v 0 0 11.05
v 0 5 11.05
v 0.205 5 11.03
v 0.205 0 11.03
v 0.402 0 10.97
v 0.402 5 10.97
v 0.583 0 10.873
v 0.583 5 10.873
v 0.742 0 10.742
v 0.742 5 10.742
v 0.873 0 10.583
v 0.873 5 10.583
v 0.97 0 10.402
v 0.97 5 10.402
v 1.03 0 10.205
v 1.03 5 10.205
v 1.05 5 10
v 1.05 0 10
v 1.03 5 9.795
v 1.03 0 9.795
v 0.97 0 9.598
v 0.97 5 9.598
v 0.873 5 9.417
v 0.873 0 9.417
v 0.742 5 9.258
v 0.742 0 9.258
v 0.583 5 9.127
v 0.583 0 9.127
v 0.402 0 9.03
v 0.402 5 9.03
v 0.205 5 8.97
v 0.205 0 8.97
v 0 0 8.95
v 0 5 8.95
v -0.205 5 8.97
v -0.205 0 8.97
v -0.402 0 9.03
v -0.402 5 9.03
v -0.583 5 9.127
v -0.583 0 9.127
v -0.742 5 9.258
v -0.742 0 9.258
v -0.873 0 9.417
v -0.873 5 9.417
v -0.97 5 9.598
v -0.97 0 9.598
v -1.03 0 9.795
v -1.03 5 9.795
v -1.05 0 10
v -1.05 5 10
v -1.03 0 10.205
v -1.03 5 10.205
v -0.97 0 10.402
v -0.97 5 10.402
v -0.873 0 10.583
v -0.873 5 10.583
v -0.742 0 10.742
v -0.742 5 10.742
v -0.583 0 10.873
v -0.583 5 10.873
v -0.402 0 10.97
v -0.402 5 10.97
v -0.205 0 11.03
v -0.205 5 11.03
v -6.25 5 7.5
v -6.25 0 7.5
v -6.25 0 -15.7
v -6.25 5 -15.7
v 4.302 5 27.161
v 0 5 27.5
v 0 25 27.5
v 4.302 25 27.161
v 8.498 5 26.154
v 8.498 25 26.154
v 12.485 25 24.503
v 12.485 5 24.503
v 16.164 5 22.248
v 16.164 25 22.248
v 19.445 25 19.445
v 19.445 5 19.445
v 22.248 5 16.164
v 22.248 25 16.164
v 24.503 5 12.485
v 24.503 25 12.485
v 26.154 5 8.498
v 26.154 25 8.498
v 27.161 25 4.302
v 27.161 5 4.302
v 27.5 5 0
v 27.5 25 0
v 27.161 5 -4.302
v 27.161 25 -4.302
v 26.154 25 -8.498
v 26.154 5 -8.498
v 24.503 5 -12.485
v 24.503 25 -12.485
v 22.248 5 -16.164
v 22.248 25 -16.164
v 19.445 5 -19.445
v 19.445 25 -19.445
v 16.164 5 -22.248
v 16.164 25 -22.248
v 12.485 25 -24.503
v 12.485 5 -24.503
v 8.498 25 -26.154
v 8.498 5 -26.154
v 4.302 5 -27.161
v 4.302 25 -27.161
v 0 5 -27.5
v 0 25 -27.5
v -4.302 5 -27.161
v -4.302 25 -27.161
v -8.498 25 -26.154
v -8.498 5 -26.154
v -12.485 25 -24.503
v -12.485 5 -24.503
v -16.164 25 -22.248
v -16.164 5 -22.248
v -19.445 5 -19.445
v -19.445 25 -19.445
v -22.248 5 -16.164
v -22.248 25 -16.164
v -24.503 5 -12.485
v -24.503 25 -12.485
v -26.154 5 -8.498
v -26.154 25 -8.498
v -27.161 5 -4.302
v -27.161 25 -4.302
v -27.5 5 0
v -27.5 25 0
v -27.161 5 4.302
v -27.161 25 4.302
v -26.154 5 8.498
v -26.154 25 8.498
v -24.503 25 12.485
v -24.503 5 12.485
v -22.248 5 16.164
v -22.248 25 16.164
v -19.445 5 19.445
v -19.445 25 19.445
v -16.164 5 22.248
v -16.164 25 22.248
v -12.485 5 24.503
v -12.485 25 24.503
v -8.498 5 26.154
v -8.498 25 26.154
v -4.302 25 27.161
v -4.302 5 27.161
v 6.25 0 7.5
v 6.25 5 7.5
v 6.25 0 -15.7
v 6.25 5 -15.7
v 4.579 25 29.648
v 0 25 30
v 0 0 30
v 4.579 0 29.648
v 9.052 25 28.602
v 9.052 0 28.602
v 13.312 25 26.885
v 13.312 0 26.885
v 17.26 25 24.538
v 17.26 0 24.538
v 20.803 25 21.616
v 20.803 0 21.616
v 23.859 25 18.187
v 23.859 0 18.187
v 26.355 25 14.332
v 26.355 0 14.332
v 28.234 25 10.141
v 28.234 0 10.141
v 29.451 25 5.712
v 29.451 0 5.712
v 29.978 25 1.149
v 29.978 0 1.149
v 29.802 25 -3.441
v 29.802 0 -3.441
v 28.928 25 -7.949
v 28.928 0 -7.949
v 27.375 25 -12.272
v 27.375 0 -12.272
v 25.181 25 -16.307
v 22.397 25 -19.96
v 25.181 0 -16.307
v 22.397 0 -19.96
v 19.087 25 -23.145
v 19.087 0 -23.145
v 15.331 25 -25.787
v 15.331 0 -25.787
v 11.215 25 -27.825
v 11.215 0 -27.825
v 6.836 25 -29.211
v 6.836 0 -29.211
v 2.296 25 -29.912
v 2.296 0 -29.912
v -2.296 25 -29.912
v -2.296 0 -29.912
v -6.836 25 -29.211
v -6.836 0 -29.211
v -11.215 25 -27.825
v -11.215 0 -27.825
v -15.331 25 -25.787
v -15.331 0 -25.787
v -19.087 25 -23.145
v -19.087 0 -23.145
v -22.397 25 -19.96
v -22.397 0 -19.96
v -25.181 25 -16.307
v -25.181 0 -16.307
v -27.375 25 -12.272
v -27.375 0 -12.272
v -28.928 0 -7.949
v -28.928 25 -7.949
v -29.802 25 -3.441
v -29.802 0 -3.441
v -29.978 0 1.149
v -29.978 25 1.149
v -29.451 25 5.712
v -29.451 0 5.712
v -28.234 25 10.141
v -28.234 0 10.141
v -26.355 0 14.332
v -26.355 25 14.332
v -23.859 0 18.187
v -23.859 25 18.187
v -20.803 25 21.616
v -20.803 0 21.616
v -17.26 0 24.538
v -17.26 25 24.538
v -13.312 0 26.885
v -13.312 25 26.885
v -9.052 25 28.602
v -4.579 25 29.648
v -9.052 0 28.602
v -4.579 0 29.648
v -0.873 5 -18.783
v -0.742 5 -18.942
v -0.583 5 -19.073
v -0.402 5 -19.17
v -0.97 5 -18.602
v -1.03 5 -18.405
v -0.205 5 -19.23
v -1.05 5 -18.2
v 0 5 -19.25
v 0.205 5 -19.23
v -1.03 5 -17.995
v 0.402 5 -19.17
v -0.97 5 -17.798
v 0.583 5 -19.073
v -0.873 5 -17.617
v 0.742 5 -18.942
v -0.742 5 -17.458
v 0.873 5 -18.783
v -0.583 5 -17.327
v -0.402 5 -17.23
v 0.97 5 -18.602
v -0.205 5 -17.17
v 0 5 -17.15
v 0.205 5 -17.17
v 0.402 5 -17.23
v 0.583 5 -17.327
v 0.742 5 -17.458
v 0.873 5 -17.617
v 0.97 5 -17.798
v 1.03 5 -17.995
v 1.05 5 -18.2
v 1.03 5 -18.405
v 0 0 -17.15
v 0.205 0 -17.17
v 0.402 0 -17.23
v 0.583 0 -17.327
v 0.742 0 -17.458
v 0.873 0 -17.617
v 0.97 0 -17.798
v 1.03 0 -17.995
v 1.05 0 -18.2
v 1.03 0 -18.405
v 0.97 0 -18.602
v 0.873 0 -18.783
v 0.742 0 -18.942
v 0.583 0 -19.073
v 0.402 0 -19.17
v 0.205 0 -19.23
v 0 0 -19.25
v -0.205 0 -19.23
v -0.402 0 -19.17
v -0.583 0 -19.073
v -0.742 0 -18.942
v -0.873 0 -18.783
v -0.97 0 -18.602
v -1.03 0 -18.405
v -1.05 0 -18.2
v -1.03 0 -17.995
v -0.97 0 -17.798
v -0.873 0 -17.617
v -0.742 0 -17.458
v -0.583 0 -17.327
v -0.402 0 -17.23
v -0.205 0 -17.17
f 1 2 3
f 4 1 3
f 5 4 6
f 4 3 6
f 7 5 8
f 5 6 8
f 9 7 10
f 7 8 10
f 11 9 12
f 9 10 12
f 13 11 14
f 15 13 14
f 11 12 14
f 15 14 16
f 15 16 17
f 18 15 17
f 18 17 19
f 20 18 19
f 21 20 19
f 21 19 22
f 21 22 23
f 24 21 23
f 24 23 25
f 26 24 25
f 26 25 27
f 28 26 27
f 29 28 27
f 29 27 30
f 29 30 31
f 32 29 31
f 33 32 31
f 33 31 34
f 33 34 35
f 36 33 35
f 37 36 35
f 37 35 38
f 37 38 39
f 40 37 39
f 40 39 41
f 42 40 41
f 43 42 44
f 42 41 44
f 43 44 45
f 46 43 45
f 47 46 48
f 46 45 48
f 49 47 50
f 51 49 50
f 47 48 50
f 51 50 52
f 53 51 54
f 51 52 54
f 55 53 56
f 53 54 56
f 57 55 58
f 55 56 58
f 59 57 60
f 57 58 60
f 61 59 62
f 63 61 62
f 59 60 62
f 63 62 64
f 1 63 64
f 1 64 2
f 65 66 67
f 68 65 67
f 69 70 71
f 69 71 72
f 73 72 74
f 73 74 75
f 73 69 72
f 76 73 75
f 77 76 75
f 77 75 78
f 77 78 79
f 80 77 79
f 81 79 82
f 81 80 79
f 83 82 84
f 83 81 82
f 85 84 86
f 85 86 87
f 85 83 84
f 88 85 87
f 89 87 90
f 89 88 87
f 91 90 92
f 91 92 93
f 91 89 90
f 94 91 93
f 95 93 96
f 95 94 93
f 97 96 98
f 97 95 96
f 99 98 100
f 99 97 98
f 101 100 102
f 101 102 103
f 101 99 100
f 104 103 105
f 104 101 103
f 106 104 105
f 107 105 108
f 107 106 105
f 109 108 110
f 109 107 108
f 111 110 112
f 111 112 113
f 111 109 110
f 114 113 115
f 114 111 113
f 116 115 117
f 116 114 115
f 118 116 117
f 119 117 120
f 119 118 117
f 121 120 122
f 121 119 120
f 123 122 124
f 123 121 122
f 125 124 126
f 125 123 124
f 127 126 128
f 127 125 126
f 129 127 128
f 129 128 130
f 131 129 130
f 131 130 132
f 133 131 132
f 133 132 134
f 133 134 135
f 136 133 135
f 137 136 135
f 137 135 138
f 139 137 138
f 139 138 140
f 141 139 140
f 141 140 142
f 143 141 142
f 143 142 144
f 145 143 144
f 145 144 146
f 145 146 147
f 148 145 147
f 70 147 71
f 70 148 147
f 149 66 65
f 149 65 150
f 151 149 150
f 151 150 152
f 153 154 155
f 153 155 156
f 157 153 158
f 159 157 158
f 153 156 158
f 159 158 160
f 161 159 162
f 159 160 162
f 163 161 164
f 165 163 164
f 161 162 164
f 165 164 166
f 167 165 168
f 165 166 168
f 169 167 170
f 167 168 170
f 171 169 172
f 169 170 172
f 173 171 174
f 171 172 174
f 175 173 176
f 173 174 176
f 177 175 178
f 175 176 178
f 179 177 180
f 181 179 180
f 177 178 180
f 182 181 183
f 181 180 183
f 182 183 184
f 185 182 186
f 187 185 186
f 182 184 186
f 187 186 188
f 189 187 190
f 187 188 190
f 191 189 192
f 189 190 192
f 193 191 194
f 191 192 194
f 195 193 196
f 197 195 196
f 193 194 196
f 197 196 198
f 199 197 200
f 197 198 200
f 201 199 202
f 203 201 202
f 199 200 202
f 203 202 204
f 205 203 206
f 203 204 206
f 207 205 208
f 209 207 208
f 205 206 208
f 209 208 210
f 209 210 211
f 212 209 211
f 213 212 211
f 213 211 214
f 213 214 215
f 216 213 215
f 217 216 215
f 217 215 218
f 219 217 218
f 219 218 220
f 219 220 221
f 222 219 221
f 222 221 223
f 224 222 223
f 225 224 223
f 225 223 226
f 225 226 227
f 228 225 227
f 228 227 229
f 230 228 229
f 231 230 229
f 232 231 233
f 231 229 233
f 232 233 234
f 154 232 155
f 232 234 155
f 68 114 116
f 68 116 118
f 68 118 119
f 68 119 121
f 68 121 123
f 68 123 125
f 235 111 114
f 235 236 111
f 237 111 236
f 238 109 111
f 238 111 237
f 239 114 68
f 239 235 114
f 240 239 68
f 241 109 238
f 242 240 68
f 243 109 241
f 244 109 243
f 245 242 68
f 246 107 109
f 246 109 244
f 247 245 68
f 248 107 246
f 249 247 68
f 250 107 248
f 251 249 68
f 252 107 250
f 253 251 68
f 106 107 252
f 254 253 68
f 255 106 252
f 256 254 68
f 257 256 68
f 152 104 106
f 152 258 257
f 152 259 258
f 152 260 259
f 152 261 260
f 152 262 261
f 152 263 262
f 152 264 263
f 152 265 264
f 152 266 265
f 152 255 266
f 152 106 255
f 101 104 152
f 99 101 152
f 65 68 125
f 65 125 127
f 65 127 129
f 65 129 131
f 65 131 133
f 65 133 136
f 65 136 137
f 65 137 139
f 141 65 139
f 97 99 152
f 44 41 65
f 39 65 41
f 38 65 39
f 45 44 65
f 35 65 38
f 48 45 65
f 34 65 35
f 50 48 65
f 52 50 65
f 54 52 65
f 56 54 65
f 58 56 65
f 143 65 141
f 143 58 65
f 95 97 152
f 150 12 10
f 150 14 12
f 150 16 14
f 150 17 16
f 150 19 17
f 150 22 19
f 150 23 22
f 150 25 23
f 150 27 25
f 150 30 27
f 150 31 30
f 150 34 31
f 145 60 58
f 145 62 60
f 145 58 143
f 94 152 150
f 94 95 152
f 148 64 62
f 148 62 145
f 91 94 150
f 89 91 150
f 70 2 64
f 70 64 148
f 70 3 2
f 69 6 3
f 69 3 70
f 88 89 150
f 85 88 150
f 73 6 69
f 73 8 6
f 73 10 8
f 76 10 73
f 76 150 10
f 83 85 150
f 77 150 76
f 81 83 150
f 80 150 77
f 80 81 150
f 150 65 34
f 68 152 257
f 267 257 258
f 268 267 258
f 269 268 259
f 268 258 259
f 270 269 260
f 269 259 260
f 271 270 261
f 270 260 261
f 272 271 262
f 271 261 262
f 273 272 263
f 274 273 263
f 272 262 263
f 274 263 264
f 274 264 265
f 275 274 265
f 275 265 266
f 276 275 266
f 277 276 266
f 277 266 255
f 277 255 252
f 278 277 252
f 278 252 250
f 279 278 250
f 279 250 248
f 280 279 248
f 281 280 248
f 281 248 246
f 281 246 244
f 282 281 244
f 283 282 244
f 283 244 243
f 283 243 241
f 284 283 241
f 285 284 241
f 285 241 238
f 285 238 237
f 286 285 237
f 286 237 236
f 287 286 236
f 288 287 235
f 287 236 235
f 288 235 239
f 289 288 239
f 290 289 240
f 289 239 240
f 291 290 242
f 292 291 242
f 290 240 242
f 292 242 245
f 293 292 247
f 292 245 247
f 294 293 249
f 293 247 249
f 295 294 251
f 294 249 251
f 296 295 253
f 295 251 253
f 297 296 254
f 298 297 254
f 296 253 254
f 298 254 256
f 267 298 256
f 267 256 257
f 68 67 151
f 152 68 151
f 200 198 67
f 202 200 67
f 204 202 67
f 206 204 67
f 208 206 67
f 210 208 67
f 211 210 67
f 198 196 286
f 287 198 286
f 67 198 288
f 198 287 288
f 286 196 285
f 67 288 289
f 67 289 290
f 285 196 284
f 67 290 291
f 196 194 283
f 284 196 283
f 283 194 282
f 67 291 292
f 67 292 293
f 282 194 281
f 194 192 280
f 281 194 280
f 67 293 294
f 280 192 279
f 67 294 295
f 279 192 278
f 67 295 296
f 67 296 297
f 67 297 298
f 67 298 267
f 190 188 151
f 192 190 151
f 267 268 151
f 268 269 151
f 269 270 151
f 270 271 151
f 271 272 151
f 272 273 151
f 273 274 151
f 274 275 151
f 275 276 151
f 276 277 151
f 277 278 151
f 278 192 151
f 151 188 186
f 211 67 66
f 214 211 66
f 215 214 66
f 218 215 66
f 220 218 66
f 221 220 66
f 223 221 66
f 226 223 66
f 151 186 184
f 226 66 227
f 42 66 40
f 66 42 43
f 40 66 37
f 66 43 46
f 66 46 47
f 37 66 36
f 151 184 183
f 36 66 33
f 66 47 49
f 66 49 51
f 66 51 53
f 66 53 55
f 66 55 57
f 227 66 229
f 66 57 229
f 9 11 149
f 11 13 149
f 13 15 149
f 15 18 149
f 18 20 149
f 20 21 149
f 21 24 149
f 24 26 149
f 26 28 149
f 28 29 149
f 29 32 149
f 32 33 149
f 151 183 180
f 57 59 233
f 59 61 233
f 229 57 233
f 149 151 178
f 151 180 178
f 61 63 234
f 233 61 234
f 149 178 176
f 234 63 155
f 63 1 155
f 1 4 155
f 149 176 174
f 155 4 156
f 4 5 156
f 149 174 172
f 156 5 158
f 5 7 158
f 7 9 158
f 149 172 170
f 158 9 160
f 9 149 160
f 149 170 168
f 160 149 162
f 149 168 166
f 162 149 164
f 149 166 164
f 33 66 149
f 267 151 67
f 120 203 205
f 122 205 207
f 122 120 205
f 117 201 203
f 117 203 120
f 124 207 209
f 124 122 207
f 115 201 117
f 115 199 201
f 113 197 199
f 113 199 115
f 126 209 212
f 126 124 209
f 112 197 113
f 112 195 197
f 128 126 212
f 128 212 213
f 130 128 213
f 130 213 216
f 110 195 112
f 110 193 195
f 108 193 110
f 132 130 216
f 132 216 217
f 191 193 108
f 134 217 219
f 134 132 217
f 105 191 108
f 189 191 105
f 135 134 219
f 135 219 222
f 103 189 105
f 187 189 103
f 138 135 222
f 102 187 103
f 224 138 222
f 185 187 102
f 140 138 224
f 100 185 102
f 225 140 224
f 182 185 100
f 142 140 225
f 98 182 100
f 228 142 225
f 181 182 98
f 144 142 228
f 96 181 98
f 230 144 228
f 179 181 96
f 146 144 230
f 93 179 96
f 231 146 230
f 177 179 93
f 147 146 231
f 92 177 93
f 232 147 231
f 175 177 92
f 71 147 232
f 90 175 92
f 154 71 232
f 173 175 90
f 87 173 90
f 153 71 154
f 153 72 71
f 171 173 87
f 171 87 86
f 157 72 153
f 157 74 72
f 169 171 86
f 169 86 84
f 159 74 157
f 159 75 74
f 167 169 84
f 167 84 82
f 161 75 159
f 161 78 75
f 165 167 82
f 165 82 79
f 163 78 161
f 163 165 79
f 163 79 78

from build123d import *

# Parameters (mm, degrees)
SKETCH1_R           = 30
SKETCH1_W           = 12.5
SKETCH1_H           = 23.2
BOSS_EXTRUDE1_DEPTH = 5
SKETCH4_R           = 30
SKETCH4_R_2         = 27.5
BOSS_EXTRUDE3_DEPTH = 20
CUT_EXTRUDE2_REACH  = 48.904
SKETCH5_R           = 1.05


with BuildPart() as part:
    # Sketch1 → Boss-Extrude1 (new body)
    with BuildSketch(Plane(origin=(0, 0, 0), x_dir=(1, 0, 0), z_dir=(0, 1, 0))):
        with Locations(Location((0, 0, 0), (0, 0, 270))):
            Circle(SKETCH1_R)
        with Locations((0, 4.1)):
            Rectangle(SKETCH1_W, SKETCH1_H, mode=Mode.SUBTRACT)
    extrude(amount=BOSS_EXTRUDE1_DEPTH)

    # Sketch4 → Boss-Extrude3 (add)
    with BuildSketch(Plane(origin=(0, 5, 0), x_dir=(1, 0, 0), z_dir=(0, 1, 0))):
        with Locations(Location((0, 0, 0), (0, 0, 270))):
            Circle(SKETCH4_R)
        with Locations(Location((0, 0, 0), (0, 0, 270))):
            Circle(SKETCH4_R_2, mode=Mode.SUBTRACT)
    extrude(amount=BOSS_EXTRUDE3_DEPTH)

    # Sketch5 → Cut-Extrude2 (cut, up to next)
    with BuildSketch(Plane(origin=(0, 5, 0), x_dir=(1, 0, 0), z_dir=(0, 1, 0)), mode=Mode.PRIVATE) as cut_extrude2_sk1:
        with Locations(Location((0, 18.2, 0), (0, 0, 270))):
            Circle(SKETCH5_R)
    cut_extrude2_tool1 = extrude(cut_extrude2_sk1.sketch, amount=-CUT_EXTRUDE2_REACH, mode=Mode.PRIVATE) & part.part
    # Sketch5 → Cut-Extrude2 (cut, up to next)
    with BuildSketch(Plane(origin=(0, 5, 0), x_dir=(1, 0, 0), z_dir=(0, 1, 0)), mode=Mode.PRIVATE) as cut_extrude2_sk2:
        with Locations(Location((0, -10, 0), (0, 0, 270))):
            Circle(SKETCH5_R)
    cut_extrude2_tool2 = extrude(cut_extrude2_sk2.sketch, amount=-CUT_EXTRUDE2_REACH, mode=Mode.PRIVATE) & part.part
    add(cut_extrude2_tool1.solids().sort_by_distance((0, 5, -18.2))[0], mode=Mode.SUBTRACT)
    add(cut_extrude2_tool2.solids().sort_by_distance((0, 5, 10))[0], mode=Mode.SUBTRACT)


solid = part.part
